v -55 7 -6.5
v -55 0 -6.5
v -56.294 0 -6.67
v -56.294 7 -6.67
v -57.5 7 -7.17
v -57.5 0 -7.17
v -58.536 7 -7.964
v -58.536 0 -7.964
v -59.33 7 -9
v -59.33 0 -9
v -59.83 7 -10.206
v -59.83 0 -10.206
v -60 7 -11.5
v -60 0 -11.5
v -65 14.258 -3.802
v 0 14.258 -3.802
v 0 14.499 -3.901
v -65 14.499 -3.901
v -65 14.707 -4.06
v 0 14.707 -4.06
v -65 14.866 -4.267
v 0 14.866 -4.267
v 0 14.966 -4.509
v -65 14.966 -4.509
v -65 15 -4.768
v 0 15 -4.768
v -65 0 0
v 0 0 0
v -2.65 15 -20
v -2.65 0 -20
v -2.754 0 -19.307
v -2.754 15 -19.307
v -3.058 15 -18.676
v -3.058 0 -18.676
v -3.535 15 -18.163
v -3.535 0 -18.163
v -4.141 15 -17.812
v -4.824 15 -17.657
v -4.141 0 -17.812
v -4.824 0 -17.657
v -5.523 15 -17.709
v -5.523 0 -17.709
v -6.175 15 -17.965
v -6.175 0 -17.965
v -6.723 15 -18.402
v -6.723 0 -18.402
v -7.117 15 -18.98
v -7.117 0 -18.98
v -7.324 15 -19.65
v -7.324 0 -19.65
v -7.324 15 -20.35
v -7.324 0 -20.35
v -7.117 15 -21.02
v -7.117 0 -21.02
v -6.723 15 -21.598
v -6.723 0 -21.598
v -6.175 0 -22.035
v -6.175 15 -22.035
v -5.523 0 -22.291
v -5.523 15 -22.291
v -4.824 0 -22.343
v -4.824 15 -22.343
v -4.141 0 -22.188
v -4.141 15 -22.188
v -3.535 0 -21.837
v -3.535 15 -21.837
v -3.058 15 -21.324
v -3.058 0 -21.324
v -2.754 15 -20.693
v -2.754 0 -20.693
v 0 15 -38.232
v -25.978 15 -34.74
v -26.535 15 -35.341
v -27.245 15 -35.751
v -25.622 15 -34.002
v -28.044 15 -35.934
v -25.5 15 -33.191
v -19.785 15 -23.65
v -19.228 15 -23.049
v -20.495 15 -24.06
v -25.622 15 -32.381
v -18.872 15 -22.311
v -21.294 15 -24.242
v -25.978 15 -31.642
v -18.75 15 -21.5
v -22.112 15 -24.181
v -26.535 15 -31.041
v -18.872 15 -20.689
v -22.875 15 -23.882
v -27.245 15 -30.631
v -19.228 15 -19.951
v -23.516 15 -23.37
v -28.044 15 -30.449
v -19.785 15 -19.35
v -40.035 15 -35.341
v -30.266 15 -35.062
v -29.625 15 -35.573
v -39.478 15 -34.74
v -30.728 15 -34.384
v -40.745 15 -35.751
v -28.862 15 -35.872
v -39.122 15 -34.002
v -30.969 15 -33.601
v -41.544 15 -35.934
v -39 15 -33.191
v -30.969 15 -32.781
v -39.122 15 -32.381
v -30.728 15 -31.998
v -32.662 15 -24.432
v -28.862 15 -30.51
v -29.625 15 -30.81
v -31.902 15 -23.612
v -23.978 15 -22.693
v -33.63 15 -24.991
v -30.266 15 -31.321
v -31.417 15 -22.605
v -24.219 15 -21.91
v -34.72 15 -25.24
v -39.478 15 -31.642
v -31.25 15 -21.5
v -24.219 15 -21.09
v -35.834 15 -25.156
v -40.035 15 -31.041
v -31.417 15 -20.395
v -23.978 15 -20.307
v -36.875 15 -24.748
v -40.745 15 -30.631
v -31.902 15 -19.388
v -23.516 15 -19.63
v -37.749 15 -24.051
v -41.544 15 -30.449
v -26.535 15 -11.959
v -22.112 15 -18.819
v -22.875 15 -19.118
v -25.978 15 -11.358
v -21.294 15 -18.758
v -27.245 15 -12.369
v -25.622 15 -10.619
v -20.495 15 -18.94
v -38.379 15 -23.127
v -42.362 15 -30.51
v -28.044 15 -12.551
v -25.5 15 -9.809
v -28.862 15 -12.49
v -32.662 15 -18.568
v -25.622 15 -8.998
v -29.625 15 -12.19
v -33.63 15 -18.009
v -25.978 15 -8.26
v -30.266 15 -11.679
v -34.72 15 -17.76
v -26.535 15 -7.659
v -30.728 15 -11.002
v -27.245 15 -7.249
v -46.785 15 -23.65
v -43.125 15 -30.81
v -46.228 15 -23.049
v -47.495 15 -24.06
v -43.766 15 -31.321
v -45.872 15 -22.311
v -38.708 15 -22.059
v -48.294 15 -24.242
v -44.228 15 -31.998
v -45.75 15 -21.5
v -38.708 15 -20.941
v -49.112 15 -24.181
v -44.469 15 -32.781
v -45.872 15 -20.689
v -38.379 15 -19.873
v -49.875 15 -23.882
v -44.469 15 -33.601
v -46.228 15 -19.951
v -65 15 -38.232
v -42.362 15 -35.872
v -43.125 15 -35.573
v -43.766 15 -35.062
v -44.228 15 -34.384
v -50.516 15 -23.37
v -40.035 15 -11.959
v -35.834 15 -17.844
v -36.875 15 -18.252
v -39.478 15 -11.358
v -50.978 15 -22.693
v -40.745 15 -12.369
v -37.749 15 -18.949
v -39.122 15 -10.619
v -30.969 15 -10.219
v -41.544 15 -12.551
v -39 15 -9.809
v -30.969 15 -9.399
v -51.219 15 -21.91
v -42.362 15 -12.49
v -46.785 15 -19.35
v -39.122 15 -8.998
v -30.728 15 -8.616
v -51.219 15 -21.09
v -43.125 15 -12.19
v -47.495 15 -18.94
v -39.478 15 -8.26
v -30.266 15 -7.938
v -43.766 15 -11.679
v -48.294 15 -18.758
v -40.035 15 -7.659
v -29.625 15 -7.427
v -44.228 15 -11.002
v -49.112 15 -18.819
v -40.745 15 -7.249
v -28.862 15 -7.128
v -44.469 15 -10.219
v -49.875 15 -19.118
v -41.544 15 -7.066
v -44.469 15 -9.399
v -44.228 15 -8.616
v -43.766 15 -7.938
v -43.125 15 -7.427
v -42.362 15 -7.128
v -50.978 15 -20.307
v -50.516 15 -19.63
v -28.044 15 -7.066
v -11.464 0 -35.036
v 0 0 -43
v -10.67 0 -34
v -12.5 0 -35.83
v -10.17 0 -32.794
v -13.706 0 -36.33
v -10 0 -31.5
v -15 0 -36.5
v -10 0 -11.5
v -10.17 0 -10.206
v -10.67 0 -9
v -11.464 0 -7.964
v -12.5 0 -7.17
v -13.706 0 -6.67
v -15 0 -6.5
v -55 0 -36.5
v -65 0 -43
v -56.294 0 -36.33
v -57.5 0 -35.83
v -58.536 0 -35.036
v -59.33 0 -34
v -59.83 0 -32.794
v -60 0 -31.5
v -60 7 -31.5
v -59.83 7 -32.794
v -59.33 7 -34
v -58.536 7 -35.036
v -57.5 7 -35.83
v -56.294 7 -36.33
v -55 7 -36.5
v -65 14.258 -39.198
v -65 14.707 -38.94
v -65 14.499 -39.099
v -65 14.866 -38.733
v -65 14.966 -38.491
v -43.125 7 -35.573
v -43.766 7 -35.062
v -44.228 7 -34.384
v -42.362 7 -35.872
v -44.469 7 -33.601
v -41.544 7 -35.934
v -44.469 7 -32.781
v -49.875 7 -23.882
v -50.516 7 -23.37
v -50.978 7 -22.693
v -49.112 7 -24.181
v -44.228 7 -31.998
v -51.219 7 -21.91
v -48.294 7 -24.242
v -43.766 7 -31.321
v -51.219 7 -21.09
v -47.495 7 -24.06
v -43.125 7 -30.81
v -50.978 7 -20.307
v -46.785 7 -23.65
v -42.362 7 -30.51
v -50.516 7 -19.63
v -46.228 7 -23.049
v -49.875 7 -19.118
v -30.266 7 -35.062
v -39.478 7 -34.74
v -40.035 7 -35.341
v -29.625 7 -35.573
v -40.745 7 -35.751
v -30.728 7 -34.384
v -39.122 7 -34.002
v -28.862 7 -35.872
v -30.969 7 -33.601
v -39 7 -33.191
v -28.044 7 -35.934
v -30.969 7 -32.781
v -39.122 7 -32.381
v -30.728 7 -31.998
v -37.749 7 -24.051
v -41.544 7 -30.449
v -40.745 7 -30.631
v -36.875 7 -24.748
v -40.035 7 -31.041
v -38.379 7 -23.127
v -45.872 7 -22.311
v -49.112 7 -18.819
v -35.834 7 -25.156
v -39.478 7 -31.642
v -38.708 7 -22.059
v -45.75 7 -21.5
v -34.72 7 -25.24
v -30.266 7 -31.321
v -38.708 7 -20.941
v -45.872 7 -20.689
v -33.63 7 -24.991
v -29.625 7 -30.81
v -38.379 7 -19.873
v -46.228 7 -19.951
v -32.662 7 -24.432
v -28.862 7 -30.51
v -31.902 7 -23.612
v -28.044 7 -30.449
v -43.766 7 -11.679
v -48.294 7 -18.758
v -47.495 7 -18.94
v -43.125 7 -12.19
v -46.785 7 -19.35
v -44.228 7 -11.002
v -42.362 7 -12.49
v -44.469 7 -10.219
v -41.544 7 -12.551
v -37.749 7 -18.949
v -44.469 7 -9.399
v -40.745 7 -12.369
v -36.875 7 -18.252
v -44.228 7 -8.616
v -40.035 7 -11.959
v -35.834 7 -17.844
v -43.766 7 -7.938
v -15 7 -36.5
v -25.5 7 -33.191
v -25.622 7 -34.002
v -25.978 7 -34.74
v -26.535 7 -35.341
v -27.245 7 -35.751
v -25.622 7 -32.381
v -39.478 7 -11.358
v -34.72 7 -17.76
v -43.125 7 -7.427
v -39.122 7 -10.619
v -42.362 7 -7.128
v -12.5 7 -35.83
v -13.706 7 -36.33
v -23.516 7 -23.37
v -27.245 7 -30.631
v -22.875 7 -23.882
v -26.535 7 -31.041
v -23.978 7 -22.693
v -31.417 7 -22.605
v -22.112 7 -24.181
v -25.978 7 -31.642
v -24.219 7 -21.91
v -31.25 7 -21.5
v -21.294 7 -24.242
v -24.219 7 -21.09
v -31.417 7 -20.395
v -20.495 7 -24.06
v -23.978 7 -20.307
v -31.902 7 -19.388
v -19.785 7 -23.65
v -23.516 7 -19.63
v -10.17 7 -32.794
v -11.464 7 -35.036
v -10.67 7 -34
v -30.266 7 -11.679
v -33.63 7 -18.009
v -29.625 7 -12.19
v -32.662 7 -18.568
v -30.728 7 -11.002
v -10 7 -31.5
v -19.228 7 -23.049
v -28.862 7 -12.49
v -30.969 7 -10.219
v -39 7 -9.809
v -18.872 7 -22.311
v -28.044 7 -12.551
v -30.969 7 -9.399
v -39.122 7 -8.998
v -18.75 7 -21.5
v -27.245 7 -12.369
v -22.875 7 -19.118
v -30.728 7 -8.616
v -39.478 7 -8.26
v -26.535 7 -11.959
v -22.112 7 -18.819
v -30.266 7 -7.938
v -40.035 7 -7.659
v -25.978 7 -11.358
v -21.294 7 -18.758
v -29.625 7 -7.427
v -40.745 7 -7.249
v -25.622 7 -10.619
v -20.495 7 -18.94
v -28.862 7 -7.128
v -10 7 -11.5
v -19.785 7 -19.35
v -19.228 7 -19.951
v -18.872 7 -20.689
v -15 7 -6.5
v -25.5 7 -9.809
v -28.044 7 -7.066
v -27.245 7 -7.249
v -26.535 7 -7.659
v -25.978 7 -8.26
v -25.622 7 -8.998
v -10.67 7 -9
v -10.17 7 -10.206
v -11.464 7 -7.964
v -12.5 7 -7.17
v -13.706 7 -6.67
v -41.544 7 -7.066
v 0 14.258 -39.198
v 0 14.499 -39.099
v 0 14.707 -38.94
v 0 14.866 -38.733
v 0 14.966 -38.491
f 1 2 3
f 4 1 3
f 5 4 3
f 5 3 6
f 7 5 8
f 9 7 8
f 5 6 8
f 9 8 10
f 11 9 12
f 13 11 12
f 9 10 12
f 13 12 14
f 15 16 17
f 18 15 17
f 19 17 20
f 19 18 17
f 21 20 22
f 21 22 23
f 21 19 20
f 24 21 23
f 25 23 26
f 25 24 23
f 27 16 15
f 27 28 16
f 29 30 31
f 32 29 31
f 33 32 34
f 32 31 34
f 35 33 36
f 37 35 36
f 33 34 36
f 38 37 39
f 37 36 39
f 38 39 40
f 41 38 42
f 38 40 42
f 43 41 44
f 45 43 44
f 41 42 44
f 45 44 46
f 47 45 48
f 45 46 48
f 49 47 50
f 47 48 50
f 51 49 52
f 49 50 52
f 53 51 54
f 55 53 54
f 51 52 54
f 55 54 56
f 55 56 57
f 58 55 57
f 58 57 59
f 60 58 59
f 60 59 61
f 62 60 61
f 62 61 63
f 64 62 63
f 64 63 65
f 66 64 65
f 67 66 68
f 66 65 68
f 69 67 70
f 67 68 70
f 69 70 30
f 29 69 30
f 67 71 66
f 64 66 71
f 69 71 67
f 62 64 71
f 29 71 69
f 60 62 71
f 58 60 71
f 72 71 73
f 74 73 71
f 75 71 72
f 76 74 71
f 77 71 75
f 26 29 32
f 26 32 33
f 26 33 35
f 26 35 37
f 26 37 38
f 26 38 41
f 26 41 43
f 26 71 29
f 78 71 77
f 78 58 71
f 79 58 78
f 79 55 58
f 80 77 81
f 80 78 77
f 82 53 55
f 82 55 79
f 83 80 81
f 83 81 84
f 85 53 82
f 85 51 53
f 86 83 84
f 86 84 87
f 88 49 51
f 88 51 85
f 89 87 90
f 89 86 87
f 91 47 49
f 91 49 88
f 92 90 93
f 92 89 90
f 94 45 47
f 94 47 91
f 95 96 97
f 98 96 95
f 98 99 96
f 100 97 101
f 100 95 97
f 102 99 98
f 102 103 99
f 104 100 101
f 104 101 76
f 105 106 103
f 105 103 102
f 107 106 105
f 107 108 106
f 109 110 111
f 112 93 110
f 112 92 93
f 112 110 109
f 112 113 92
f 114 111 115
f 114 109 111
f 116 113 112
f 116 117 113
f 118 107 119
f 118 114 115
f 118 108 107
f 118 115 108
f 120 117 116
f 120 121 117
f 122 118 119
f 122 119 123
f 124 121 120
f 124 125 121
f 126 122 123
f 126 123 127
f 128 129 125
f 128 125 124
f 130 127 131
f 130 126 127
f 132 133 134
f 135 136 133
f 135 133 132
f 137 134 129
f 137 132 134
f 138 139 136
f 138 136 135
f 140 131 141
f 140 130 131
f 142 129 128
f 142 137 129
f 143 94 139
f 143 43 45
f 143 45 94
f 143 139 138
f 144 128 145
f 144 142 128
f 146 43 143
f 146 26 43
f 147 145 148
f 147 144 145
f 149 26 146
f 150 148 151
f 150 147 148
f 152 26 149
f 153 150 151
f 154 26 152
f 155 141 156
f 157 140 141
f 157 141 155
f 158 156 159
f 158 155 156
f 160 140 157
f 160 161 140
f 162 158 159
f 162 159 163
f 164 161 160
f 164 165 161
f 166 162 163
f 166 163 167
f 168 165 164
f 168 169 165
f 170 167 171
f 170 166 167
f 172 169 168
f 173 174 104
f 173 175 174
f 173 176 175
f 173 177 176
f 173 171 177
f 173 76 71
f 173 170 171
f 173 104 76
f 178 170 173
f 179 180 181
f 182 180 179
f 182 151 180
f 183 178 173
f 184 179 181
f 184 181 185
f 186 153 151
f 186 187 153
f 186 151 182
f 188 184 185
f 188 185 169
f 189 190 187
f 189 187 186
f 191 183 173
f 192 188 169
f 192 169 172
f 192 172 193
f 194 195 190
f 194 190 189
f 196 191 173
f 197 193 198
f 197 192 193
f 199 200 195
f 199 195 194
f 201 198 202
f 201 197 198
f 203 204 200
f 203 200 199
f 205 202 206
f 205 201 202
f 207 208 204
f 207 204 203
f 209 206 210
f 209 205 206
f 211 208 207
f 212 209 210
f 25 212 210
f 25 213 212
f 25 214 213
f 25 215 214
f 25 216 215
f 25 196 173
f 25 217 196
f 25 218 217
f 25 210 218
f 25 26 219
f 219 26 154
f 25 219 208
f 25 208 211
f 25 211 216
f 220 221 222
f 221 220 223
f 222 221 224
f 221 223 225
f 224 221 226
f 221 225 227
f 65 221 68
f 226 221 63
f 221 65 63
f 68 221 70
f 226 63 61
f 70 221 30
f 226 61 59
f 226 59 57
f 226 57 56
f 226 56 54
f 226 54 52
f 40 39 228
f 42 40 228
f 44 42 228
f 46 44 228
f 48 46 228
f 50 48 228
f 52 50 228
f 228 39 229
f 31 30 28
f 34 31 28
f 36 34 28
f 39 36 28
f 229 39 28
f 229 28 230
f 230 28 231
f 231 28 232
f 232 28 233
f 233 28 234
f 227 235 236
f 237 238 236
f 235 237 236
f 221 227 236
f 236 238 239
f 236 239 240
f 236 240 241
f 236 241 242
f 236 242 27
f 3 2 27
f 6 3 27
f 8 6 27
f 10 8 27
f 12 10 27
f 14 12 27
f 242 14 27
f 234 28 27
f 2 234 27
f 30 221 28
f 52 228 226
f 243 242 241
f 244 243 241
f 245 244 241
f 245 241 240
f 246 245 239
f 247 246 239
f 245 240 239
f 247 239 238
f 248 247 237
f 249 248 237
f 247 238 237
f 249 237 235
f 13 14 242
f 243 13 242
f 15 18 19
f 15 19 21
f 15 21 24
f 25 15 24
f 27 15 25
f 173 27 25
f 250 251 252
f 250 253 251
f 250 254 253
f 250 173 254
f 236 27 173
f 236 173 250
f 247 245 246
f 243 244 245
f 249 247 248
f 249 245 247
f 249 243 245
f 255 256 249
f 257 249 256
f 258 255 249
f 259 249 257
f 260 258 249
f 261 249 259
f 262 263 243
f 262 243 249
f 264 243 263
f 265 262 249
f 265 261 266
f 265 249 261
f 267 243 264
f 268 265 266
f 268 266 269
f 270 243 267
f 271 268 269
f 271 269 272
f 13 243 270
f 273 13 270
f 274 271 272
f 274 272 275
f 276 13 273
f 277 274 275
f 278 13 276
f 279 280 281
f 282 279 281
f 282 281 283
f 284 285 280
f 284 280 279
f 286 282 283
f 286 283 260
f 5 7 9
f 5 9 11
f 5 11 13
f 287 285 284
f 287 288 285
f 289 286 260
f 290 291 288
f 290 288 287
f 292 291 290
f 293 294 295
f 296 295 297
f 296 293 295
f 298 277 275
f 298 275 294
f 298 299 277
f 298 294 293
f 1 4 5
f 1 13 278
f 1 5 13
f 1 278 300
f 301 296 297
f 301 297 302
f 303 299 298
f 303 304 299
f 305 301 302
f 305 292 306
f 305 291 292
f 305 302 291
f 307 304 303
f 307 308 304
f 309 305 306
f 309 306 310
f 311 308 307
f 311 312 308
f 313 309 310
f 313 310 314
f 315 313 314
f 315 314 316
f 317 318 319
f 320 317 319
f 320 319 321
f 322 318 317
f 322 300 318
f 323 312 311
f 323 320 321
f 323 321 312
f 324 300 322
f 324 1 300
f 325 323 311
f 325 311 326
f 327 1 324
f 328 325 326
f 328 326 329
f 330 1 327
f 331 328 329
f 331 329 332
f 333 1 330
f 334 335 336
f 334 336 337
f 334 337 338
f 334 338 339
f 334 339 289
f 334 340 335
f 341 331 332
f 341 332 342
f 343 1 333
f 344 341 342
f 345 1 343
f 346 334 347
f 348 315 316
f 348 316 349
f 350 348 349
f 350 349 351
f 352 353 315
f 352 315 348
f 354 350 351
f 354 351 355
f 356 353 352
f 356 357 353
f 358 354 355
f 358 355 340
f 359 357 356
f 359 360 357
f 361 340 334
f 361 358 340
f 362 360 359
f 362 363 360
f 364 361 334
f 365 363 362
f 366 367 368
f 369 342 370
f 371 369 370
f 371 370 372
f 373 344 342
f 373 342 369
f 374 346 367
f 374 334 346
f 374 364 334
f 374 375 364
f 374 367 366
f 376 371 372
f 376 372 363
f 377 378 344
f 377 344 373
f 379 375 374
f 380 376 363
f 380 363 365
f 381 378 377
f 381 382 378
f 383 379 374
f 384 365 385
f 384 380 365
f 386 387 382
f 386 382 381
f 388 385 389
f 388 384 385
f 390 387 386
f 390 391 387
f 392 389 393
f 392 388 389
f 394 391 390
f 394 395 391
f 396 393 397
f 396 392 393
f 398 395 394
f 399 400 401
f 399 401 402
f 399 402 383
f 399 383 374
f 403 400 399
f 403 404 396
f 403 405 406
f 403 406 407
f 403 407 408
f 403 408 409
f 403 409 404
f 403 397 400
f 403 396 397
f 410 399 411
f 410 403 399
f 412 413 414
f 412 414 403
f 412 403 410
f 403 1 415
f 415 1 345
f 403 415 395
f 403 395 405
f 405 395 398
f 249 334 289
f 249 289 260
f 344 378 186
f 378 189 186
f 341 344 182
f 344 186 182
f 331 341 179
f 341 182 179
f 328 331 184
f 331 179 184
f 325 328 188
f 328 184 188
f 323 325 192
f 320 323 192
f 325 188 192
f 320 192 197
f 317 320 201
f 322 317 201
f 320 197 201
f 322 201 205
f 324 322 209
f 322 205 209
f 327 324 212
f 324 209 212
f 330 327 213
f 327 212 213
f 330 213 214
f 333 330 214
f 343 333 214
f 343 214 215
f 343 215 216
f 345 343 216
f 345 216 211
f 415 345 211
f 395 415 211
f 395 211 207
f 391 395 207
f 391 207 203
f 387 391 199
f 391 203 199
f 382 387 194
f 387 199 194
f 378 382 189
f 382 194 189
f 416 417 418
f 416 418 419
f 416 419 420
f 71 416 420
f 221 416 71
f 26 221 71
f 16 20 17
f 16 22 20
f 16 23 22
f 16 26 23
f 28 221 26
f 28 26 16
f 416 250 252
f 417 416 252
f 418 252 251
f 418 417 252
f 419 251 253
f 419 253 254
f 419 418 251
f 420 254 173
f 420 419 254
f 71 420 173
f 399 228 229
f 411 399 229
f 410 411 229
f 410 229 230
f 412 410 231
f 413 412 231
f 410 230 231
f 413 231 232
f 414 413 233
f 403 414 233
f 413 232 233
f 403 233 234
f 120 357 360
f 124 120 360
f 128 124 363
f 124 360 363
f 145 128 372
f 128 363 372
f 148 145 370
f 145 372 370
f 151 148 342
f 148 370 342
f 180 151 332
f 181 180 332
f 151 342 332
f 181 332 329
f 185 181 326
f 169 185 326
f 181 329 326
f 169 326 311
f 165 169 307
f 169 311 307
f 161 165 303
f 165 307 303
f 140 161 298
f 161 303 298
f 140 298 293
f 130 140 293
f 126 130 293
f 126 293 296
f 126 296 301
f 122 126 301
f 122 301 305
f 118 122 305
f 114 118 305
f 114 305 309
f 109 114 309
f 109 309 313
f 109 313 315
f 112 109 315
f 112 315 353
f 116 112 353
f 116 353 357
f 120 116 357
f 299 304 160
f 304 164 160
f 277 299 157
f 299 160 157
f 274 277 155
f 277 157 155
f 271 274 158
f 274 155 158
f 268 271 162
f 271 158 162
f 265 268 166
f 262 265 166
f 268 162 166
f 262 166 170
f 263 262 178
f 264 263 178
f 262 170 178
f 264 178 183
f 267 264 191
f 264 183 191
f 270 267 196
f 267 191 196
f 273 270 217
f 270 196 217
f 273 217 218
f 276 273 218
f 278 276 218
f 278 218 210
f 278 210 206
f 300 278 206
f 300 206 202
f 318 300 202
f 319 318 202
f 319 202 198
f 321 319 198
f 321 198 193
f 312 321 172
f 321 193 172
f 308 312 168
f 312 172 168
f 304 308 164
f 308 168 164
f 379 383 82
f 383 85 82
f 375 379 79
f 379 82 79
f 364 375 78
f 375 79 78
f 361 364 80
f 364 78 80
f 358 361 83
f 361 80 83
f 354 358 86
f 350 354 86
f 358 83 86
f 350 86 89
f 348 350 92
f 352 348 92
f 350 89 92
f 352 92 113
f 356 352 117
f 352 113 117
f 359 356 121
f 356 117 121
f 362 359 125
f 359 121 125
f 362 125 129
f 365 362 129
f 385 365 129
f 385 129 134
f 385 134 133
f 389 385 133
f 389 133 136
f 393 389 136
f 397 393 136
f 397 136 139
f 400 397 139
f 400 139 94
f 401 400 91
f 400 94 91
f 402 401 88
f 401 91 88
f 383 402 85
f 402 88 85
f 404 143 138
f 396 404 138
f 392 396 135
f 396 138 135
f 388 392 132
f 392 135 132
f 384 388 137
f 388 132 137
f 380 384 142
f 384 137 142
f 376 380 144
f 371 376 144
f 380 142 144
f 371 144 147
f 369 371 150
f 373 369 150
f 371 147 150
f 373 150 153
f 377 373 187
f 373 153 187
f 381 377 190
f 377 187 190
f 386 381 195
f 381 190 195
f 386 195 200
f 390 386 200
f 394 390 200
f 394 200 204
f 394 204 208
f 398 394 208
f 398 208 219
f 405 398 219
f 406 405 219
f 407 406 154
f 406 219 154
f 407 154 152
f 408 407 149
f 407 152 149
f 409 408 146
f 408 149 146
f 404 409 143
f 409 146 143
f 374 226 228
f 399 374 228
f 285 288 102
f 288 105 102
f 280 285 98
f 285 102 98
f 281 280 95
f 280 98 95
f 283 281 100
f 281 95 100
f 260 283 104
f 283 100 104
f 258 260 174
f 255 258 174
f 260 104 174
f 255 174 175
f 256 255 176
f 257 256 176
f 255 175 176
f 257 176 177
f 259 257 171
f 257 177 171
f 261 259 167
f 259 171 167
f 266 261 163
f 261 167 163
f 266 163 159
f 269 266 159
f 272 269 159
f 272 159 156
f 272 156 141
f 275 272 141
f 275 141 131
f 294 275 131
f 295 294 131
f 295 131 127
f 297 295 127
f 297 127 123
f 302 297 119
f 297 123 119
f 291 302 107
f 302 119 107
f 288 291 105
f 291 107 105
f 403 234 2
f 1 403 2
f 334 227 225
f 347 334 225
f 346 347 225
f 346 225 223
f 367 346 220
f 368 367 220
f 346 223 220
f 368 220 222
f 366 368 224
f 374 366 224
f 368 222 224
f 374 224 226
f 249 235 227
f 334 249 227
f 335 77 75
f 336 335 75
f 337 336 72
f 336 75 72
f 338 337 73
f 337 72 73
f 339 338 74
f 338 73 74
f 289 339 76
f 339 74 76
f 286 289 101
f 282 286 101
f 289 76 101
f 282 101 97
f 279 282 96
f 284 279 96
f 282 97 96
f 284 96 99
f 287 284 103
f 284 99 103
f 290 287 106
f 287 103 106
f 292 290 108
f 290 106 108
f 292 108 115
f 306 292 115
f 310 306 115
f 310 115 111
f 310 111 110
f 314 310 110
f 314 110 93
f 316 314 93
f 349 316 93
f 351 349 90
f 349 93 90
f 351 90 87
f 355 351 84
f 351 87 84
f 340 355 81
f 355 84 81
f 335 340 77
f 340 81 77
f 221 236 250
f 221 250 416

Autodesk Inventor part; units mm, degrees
ref_plane "YZ Plane" through (0, 0, 0) normal (1, 0, 0) x (0, 1, 0)
ref_plane "XZ Plane" through (0, 0, 0) normal (0, 1, 0) x (-1, 0, 0)
ref_plane "XY Plane" through (0, 0, 0) normal (0, 0, 1) x (1, 0, 0)
sketch "Sketch1" plane through (0, 0, 0) normal (0, 1, 0) x (-1, 0, 0)
  line L0 (0, 0) -> (65, 0)
  line L1 (65, 0) -> (65, -43)
  line L2 (65, -43) -> (0, -43)
  line L3 (0, -43) -> (0, 0)
  dimension "d0" = 65
  dimension "d1" = 43
extrude "Extrusion1" add sketch "Sketch1" along normal blind 15
sketch "Sketch2" plane through (0, 0, 0) normal (0, -1, 0) x (1, 0, 0)
  line L0 (-55, -36.5) -> (-15, -36.5)
  line L1 (-10, -31.5) -> (-10, -11.5)
  line L2 (-15, -6.5) -> (-55, -6.5)
  line L3 (-60, -11.5) -> (-60, -31.5)
  line L4 (-65, 0) -> (0, 0) projected
  line L5 (0, -43) -> (-65, -43) projected
  line L6 (0, 0) -> (0, -43) projected
  line L7 (-65, -43) -> (-65, 0) projected
  arc A0 (-10, -11.5) -> (-15, -6.5) centre (-15, -11.5) ccw
  arc A1 (-55, -6.5) -> (-60, -11.5) centre (-55, -11.5) ccw
  arc A2 (-60, -31.5) -> (-55, -36.5) centre (-55, -31.5) ccw
  arc A3 (-15, -36.5) -> (-10, -31.5) centre (-15, -31.5) ccw
  dimension "d4" = 6.5
  dimension "d5" = 6.5
  dimension "d6" = 10
  dimension "d7" = 5
  dimension "d8" = 5
extrude "Extrusion2" cut sketch "Sketch2" against normal blind 7 contours A2 L3 A1 L2 A0 L1 A3 L0
sketch "Sketch3" plane through (0, 7, 0) normal (0, -1, 0) x (1, 0, 0)
  circle A0 centre (-35, -21.5) radius 3.75
  line L0 (-10, -11.5) -> (-10, -31.5) projected
  line L1 (-15, -36.5) -> (-55, -36.5) projected
  point P0 (0, 0)
  dimension "d11" = 7.5
  dimension "d12" = 25
  dimension "d13" = 15
extrude "Extrusion3" cut sketch "Sketch3" against normal blind 8
thread "Thread1" size "3/8-16 UNC" class "2B" standard "ANSI Unified Screw Threads" full length
sketch "Sketch4" plane through (0, 0, 0) normal (0, -1, 0) x (1, 0, 0)
  circle A0 centre (-5, -20) radius 2.35
  line L0 (-65, 0) -> (0, 0) projected
  line L1 (0, 0) -> (0, -43) projected
  dimension "d18" = 4.7
  dimension "d19" = 20
  dimension "d20" = 5
extrude "Extrusion4" cut sketch "Sketch4" against normal blind 15
thread "Thread2" size "12-24 UNC" class "2B" standard "ANSI Unified Screw Threads" full length
chamfer "Chamfer1" distance 4 distance2 15 2 edges at (-32.5, 15, -43) (-32.5, 15, 0) measured on face at (-33.1827, 15, -37.0742)
fillet "Fillet1" radius 1 2 edges at (-32.5, 15, -39.0005) (-32.5, 15, -3.9995)
sketch "Sketch5" plane through (0, 15, 0) normal (0, 1, 0) x (1, 0, 0)
  circle A0 centre (-21.5, 21.5) radius 2.75
  circle A1 centre (-35, 21.5) radius 3.75 projected
  circle A2 centre (-28.25, 33.1913) radius 2.75
  circle A3 centre (-41.75, 33.1913) radius 2.75
  circle A4 centre (-48.5, 21.5) radius 2.75
  circle A5 centre (-41.75, 9.8087) radius 2.75
  circle A6 centre (-28.25, 9.8087) radius 2.75
  point P0 (0, 0)
  dimension "d29" = 5.5
  dimension "d30" = 13.5
  dimension "d33" = 360
extrude "Extrusion5" cut sketch "Sketch5" against normal blind 15 contours A0 | A2 | A3 | A4 | A5 | A6
properties part number "Wedge-Dove tail"
